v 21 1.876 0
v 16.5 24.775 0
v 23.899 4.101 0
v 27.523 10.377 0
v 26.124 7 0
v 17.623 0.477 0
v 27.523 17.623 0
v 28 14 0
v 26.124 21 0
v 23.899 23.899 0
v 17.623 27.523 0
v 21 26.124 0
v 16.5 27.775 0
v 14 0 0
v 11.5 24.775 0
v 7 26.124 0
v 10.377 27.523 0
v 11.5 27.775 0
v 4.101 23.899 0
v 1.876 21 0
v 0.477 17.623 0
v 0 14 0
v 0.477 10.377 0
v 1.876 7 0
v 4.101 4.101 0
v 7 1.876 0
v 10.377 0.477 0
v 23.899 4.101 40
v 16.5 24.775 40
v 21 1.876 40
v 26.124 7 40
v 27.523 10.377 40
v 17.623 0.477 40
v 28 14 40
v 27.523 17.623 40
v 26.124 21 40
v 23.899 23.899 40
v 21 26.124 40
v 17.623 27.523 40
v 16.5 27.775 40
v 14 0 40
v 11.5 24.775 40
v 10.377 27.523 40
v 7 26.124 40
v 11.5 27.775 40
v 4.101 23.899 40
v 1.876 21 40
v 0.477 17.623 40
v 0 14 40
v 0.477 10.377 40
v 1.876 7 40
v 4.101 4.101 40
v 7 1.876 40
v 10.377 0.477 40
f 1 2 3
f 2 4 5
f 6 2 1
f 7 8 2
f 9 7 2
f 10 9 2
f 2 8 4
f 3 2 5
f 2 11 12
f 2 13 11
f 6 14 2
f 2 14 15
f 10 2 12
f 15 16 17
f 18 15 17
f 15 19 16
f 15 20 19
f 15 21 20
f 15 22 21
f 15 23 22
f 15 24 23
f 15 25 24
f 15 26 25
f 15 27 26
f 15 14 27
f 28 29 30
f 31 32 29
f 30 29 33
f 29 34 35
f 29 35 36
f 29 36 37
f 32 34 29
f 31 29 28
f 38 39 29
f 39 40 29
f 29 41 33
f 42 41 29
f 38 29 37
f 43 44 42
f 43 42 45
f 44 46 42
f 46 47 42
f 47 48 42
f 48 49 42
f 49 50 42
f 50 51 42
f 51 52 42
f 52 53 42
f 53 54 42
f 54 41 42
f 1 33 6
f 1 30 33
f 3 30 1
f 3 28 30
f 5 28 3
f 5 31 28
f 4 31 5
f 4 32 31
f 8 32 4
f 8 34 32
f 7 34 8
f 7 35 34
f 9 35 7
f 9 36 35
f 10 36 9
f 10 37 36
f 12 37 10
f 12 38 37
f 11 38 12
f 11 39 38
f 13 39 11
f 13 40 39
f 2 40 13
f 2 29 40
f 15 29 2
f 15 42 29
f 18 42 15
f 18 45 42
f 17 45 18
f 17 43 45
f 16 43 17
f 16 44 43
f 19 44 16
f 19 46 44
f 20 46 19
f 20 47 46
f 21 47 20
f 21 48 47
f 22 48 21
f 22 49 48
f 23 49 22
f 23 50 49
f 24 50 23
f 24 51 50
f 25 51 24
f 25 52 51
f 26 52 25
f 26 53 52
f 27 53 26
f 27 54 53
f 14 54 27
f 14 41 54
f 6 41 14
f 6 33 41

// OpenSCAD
$fn = 32;

// ----------------------------------------------------------------------
// Keyway shaft: d28 shaft, key 5 x 3 mm
// ----------------------------------------------------------------------

// --- parameters (mm) ---
shaft_r = 14;             // shaft radius
key_w = 5;                // keyway width
key_d = 3;                // keyway depth below the surface line
plate_t = 40;             // shaft length, Z (extrusion height)

shaft_d = 2 * shaft_r;  // shaft diameter
circle_step = 15;  // polygon sampling step, degrees

profile = [[10.377, 27.523], [7, 26.124], [4.101, 23.899], [1.876, 21], [0.477, 17.623], [0, 14], [0.477, 10.377], [1.876, 7], [4.101, 4.101], [7, 1.876], [10.377, 0.477], [14, 0], [17.623, 0.477], [21, 1.876], [23.899, 4.101], [26.124, 7], [27.523, 10.377], [28, 14], [27.523, 17.623], [26.124, 21], [23.899, 23.899], [21, 26.124], [17.623, 27.523], [16.5, 27.775], [16.5, 24.775], [11.5, 24.775], [11.5, 27.775]];  // primary outline, 27 points, counter clockwise

// --- the one profile operation ---
linear_extrude(height = plate_t) polygon(points = profile);
